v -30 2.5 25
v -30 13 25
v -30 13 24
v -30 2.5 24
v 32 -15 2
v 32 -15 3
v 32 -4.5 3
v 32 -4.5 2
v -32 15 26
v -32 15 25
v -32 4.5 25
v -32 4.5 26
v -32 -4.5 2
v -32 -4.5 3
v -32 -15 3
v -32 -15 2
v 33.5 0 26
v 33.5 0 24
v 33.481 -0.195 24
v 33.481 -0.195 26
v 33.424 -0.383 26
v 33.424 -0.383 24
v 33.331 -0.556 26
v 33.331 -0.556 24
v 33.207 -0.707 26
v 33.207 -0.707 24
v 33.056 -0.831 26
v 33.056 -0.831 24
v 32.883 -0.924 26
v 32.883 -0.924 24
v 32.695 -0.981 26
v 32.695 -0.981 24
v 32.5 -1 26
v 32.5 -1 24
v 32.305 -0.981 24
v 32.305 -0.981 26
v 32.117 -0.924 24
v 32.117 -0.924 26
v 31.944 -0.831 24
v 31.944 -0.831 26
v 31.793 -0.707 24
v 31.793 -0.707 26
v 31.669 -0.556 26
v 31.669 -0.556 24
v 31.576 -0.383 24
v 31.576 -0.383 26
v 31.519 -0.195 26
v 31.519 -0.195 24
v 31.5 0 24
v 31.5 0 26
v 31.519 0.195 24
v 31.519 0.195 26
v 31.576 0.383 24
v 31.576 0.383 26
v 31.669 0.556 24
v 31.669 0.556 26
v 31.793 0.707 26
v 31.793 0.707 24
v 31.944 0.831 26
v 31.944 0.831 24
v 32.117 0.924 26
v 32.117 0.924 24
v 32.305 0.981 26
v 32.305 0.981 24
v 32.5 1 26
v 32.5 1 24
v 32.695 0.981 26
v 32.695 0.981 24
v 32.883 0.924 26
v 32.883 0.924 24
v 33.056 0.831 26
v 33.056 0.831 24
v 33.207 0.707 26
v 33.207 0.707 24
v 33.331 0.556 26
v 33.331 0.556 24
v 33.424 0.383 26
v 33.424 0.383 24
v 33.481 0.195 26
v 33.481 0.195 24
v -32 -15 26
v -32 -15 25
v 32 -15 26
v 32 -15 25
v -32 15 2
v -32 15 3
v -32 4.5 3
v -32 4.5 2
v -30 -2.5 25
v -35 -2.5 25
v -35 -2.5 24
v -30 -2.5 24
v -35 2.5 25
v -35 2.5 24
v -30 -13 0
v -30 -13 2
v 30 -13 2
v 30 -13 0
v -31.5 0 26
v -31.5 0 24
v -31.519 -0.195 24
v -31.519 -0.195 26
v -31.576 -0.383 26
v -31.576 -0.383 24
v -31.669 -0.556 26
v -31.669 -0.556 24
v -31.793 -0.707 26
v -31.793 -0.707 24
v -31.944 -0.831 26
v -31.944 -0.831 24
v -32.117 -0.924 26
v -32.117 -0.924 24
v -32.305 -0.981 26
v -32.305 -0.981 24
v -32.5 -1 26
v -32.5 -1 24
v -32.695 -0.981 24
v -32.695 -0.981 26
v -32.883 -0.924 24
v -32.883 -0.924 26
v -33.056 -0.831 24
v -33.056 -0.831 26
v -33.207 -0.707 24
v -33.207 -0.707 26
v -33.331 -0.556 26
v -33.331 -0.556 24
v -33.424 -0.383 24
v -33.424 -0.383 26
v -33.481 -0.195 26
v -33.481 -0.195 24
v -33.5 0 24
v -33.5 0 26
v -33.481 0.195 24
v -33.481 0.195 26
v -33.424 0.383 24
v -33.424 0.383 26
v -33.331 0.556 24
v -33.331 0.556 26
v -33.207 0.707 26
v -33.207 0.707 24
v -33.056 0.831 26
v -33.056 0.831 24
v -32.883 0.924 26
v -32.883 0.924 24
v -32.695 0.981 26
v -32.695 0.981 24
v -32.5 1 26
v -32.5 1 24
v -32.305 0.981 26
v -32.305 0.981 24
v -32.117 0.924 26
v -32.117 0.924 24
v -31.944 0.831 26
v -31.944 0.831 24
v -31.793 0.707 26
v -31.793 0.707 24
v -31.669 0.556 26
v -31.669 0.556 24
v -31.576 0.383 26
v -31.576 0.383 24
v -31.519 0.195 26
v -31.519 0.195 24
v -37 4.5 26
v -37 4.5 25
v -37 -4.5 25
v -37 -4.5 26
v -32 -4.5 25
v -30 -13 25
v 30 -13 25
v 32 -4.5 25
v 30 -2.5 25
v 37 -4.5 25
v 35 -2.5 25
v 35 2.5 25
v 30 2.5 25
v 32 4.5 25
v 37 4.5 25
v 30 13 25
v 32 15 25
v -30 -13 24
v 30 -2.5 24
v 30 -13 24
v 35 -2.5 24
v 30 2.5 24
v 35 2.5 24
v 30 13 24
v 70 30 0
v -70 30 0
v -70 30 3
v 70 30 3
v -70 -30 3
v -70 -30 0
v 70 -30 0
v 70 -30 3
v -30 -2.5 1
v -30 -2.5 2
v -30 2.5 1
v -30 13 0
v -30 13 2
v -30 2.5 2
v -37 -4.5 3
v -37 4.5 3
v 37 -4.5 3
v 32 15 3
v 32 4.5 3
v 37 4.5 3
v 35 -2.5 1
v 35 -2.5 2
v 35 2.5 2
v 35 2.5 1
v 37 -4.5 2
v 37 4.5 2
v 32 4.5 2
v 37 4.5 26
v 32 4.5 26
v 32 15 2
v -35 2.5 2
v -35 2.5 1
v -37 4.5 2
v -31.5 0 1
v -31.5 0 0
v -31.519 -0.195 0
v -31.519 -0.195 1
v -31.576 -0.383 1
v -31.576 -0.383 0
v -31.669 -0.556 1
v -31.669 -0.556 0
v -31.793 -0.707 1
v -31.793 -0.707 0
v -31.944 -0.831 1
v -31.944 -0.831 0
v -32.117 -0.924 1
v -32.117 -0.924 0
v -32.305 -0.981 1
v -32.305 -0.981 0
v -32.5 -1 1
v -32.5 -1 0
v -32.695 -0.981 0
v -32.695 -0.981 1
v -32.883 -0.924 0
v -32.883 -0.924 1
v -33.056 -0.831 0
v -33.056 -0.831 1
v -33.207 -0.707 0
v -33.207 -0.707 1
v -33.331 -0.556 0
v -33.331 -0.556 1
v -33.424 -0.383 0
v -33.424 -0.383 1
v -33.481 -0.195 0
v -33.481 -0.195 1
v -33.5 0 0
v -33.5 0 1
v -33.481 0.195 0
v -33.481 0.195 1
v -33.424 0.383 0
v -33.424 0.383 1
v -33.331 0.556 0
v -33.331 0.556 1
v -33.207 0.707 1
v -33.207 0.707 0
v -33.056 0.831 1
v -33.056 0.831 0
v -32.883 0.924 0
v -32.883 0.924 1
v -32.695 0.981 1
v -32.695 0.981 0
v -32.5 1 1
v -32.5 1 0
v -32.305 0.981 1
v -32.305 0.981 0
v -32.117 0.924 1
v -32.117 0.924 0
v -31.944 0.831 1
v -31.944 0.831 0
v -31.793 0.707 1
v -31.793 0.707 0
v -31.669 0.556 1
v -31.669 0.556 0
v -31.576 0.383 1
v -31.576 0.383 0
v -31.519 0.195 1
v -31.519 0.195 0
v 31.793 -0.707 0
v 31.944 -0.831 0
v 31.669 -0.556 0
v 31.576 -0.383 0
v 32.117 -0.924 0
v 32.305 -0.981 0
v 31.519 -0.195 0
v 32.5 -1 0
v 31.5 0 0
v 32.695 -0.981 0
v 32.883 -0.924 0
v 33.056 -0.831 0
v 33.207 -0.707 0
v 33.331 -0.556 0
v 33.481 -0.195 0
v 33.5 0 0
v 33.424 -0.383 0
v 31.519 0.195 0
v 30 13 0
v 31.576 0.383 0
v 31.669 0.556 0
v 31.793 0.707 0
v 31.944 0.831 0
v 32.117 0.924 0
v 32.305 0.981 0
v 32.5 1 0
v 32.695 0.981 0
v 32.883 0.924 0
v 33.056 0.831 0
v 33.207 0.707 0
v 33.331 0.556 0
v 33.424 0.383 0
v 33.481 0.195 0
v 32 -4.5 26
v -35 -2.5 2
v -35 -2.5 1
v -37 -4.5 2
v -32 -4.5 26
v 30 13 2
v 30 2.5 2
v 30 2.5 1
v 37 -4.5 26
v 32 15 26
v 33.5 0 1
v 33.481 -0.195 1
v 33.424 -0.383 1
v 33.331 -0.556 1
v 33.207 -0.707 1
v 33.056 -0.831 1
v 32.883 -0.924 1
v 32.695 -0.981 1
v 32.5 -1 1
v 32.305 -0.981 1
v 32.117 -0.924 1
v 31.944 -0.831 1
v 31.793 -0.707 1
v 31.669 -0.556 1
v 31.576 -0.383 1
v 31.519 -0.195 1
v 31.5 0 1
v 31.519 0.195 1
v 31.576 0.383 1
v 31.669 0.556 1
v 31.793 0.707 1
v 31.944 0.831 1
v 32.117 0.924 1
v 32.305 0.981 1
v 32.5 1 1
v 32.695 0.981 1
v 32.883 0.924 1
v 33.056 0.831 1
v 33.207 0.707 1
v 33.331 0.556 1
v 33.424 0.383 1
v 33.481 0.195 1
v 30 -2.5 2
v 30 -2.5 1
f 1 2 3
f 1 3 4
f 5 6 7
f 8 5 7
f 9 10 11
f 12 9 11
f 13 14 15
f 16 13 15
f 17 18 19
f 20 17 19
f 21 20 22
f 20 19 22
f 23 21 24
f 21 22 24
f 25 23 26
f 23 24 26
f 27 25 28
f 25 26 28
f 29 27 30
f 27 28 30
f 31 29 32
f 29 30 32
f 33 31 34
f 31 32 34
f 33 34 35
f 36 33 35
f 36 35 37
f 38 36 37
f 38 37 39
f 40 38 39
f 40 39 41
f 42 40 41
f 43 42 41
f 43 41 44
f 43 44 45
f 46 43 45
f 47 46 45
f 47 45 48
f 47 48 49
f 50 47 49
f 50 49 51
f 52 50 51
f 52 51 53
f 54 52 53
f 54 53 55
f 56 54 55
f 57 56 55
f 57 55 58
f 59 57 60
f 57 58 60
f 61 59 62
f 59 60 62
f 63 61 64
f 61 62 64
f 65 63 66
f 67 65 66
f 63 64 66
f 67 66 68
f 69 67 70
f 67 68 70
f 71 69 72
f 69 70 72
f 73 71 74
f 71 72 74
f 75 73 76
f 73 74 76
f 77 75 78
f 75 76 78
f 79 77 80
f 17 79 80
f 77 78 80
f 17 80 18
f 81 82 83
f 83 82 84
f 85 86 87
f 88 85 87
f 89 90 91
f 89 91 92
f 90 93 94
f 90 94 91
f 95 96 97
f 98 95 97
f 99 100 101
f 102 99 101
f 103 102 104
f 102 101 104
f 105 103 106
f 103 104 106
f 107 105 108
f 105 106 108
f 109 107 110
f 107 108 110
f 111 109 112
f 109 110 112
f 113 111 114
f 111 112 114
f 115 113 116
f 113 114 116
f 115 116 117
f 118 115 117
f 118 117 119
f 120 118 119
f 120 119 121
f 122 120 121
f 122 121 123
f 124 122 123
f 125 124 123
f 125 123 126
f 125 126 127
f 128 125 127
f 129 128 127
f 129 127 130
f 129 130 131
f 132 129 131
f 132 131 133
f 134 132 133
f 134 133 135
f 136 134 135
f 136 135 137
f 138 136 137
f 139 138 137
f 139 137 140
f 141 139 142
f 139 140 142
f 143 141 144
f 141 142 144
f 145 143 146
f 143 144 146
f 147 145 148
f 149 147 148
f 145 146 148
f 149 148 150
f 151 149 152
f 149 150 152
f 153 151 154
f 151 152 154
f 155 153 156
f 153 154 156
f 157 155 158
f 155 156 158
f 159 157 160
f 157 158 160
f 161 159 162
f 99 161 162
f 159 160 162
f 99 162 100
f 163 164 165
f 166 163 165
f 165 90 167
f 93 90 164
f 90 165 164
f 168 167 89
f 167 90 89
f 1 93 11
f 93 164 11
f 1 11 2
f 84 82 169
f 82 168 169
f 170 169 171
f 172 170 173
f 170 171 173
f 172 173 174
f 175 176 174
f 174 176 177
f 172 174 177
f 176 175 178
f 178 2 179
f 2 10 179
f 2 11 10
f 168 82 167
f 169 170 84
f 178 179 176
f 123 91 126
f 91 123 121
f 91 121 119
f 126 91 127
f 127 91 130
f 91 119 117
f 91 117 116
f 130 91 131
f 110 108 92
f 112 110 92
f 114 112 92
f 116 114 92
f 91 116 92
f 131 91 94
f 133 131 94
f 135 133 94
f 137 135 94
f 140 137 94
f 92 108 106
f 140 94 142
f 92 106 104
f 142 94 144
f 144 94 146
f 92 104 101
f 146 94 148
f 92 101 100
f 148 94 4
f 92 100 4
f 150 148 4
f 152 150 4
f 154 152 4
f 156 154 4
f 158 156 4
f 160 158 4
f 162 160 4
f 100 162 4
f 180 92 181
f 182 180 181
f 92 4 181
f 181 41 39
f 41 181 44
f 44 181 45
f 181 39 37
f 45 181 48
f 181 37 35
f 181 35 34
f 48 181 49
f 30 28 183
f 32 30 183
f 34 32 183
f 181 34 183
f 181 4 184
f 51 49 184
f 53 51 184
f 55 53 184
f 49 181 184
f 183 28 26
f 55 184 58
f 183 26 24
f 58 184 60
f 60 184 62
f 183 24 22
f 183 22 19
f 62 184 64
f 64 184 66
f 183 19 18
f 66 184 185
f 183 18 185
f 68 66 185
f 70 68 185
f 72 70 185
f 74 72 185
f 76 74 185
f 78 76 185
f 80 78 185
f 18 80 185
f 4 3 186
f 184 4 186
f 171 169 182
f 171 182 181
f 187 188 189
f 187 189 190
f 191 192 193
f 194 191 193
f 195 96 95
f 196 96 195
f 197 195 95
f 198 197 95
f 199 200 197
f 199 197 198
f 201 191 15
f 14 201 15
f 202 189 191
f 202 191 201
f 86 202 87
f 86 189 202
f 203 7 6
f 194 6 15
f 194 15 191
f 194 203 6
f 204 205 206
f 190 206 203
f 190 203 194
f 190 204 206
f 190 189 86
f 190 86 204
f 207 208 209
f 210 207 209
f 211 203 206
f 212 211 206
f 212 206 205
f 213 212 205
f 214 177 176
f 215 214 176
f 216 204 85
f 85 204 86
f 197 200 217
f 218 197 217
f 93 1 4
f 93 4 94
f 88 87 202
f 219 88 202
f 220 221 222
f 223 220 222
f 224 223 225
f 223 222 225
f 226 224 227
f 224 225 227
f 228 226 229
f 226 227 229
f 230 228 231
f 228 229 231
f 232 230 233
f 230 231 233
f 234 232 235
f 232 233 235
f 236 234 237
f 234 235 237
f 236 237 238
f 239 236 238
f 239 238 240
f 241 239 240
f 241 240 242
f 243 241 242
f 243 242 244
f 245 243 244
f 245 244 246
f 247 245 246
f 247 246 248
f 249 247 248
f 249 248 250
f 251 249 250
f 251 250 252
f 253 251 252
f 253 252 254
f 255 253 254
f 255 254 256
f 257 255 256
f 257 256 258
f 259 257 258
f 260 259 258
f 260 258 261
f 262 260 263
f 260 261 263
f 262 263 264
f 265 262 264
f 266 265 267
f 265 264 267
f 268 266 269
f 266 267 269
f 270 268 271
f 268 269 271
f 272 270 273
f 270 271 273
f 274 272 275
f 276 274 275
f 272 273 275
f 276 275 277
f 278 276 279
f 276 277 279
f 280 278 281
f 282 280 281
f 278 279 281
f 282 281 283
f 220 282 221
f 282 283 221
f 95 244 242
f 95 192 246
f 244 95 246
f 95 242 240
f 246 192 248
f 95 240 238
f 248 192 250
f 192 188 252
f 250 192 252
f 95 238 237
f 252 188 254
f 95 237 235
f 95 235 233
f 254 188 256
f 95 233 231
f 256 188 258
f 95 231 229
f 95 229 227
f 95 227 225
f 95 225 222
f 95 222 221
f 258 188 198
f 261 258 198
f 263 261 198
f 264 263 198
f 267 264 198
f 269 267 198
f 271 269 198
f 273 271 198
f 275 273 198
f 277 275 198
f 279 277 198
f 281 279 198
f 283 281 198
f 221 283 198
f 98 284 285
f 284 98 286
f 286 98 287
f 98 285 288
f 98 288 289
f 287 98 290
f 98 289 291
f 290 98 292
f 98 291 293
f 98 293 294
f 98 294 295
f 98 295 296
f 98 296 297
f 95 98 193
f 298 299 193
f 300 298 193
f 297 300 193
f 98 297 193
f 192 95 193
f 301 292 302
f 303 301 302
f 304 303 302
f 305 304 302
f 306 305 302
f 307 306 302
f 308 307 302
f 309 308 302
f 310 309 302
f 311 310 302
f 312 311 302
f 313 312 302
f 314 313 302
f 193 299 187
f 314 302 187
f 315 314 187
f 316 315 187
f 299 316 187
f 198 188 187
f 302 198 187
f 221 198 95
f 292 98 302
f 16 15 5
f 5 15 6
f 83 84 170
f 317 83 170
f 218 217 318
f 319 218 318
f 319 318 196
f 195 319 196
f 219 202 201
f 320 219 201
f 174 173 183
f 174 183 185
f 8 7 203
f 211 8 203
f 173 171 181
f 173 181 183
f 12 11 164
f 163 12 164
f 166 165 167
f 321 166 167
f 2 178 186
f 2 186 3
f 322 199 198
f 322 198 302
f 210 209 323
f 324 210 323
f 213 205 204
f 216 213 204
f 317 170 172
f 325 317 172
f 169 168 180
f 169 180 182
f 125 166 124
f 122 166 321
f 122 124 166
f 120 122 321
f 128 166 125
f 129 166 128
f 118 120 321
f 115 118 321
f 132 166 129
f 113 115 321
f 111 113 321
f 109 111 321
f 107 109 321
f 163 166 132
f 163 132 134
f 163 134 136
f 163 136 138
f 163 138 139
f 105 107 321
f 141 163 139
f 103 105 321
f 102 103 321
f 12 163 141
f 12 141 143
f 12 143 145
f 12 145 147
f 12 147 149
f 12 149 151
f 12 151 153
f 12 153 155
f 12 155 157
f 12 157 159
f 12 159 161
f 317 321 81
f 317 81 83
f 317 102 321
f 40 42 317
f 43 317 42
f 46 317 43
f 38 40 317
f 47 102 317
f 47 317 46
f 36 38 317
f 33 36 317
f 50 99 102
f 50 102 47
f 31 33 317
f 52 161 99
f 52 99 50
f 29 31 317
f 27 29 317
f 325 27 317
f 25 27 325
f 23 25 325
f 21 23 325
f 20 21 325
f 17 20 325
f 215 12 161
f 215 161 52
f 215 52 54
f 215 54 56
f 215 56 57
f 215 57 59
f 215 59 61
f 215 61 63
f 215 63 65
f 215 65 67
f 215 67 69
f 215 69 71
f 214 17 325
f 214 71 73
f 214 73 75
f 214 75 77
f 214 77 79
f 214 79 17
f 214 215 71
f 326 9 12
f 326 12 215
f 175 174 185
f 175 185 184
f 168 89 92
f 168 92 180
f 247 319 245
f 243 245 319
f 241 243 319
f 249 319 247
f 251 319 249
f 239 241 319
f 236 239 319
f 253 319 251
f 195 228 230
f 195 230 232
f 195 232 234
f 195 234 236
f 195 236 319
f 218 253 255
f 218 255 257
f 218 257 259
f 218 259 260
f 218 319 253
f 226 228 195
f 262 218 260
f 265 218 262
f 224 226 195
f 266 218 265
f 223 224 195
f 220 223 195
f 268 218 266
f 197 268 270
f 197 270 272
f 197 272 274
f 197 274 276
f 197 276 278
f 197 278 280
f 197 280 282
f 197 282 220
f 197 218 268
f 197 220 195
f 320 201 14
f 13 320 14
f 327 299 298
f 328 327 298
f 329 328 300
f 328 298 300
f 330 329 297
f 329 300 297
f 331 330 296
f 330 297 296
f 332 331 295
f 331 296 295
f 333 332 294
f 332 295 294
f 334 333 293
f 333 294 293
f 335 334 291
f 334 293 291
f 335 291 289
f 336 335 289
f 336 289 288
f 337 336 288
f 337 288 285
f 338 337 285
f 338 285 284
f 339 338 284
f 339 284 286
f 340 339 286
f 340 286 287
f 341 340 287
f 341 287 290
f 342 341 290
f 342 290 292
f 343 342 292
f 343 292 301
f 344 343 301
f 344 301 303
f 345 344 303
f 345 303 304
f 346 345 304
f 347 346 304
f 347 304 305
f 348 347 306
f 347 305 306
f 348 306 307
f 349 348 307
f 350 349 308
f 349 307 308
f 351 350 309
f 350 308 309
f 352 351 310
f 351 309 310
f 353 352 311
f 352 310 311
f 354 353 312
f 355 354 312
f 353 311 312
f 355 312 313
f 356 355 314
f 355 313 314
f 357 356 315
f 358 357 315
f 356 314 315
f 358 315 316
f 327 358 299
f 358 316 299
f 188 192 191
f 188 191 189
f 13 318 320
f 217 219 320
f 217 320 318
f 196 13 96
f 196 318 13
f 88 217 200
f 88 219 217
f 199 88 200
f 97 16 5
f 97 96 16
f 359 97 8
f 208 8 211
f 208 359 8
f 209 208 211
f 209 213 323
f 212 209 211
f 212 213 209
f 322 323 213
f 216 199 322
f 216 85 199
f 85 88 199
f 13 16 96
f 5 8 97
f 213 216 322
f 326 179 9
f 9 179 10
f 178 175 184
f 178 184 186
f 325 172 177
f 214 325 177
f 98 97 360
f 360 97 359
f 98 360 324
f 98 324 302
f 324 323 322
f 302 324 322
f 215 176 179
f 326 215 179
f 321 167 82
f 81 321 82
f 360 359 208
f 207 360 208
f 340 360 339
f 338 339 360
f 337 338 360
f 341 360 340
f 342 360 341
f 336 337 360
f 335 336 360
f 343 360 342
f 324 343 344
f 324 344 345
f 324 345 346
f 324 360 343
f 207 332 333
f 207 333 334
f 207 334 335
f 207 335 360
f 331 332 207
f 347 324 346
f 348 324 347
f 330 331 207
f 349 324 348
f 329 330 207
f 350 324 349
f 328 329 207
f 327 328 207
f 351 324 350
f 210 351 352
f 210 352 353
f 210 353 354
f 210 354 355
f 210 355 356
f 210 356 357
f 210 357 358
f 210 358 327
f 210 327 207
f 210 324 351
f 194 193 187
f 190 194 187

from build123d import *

# Parameters (mm, degrees)
F0_W      = 140
F0_H      = 60
F1_DEPTH  = 3
F4_DEPTH  = 2
F5_DEPTH  = 1
F6_W      = 60
F6_H      = 26
F7_DEPTH  = 25
F11_DEPTH = 1
F12_DEPTH = 1
F13_R     = 1
F14_DEPTH = 43


with BuildPart() as f1:
    # F0 (on Top) → F1 (new body)
    with BuildSketch(Plane.XY):
        Rectangle(F0_W, F0_H)
    extrude(amount=F1_DEPTH)

    # F2 (on face) → F4 (cut)
    with BuildSketch(Plane.XY.offset(3)):
        Polygon((-30, -2.5), (-30, -13), (30, -13), (30, -2.5), (35, -2.5), (35, 2.5), (30, 2.5), (30, 13), (-30, 13), (-30, 2.5), (-35, 2.5), (-35, -2.5), align=None)
    extrude(amount=-F4_DEPTH, mode=Mode.SUBTRACT)

    # F3 (on face) → F5 (cut)
    with BuildSketch(Plane.XY.offset(3)):
        Polygon((32, 15), (-32, 15), (-32, 4.5), (-37, 4.5), (-37, -4.5), (-32, -4.5), (-32, -15), (32, -15), (32, -4.5), (37, -4.5), (37, 4.5), (32, 4.5), align=None)
    extrude(amount=-F5_DEPTH, mode=Mode.SUBTRACT)

    # F6 (on face) → F7 (cut)
    with BuildSketch(Plane.XY.offset(3)):
        Rectangle(F6_W, F6_H)
    extrude(amount=-F7_DEPTH, mode=Mode.SUBTRACT)


with BuildPart() as f11:
    # F10 (on offset) → F11 (new body)
    with BuildSketch(Plane.XY.offset(25)):
        Polygon((-30, -2.5), (-30, -13), (30, -13), (30, -2.5), (35, -2.5), (35, 2.5), (30, 2.5), (30, 13), (-30, 13), (-30, 2.5), (-35, 2.5), (-35, -2.5), align=None)
    extrude(amount=-F11_DEPTH)

    # F9 (on offset) → F12 (join)
    with BuildSketch(Plane.XY.offset(25)):
        Polygon((32, 15), (-32, 15), (-32, 4.5), (-37, 4.5), (-37, -4.5), (-32, -4.5), (-32, -15), (32, -15), (32, -4.5), (37, -4.5), (37, 4.5), (32, 4.5), align=None)
    extrude(amount=F12_DEPTH)


with BuildPart() as f14_tool:
    # F13 (on face) → F14 (new body)
    with BuildSketch(Plane(origin=(0, 0, 0), x_dir=(1, 0, 0), z_dir=(0, 0, -1))):
        with Locations((-32.500006, 0)):
            Circle(F13_R)
        with Locations((32.500017, 0)):
            Circle(F13_R)
    extrude(amount=-F14_DEPTH)


with BuildPart() as f1_1:
    add(f1.part)

    # F14: cut by f14_tool
    add(f14_tool.part, mode=Mode.SUBTRACT)


with BuildPart() as f11_1:
    add(f11.part)

    # F14: cut by f14_tool
    add(f14_tool.part, mode=Mode.SUBTRACT)


solid = Compound([f1_1.part, f11_1.part])
